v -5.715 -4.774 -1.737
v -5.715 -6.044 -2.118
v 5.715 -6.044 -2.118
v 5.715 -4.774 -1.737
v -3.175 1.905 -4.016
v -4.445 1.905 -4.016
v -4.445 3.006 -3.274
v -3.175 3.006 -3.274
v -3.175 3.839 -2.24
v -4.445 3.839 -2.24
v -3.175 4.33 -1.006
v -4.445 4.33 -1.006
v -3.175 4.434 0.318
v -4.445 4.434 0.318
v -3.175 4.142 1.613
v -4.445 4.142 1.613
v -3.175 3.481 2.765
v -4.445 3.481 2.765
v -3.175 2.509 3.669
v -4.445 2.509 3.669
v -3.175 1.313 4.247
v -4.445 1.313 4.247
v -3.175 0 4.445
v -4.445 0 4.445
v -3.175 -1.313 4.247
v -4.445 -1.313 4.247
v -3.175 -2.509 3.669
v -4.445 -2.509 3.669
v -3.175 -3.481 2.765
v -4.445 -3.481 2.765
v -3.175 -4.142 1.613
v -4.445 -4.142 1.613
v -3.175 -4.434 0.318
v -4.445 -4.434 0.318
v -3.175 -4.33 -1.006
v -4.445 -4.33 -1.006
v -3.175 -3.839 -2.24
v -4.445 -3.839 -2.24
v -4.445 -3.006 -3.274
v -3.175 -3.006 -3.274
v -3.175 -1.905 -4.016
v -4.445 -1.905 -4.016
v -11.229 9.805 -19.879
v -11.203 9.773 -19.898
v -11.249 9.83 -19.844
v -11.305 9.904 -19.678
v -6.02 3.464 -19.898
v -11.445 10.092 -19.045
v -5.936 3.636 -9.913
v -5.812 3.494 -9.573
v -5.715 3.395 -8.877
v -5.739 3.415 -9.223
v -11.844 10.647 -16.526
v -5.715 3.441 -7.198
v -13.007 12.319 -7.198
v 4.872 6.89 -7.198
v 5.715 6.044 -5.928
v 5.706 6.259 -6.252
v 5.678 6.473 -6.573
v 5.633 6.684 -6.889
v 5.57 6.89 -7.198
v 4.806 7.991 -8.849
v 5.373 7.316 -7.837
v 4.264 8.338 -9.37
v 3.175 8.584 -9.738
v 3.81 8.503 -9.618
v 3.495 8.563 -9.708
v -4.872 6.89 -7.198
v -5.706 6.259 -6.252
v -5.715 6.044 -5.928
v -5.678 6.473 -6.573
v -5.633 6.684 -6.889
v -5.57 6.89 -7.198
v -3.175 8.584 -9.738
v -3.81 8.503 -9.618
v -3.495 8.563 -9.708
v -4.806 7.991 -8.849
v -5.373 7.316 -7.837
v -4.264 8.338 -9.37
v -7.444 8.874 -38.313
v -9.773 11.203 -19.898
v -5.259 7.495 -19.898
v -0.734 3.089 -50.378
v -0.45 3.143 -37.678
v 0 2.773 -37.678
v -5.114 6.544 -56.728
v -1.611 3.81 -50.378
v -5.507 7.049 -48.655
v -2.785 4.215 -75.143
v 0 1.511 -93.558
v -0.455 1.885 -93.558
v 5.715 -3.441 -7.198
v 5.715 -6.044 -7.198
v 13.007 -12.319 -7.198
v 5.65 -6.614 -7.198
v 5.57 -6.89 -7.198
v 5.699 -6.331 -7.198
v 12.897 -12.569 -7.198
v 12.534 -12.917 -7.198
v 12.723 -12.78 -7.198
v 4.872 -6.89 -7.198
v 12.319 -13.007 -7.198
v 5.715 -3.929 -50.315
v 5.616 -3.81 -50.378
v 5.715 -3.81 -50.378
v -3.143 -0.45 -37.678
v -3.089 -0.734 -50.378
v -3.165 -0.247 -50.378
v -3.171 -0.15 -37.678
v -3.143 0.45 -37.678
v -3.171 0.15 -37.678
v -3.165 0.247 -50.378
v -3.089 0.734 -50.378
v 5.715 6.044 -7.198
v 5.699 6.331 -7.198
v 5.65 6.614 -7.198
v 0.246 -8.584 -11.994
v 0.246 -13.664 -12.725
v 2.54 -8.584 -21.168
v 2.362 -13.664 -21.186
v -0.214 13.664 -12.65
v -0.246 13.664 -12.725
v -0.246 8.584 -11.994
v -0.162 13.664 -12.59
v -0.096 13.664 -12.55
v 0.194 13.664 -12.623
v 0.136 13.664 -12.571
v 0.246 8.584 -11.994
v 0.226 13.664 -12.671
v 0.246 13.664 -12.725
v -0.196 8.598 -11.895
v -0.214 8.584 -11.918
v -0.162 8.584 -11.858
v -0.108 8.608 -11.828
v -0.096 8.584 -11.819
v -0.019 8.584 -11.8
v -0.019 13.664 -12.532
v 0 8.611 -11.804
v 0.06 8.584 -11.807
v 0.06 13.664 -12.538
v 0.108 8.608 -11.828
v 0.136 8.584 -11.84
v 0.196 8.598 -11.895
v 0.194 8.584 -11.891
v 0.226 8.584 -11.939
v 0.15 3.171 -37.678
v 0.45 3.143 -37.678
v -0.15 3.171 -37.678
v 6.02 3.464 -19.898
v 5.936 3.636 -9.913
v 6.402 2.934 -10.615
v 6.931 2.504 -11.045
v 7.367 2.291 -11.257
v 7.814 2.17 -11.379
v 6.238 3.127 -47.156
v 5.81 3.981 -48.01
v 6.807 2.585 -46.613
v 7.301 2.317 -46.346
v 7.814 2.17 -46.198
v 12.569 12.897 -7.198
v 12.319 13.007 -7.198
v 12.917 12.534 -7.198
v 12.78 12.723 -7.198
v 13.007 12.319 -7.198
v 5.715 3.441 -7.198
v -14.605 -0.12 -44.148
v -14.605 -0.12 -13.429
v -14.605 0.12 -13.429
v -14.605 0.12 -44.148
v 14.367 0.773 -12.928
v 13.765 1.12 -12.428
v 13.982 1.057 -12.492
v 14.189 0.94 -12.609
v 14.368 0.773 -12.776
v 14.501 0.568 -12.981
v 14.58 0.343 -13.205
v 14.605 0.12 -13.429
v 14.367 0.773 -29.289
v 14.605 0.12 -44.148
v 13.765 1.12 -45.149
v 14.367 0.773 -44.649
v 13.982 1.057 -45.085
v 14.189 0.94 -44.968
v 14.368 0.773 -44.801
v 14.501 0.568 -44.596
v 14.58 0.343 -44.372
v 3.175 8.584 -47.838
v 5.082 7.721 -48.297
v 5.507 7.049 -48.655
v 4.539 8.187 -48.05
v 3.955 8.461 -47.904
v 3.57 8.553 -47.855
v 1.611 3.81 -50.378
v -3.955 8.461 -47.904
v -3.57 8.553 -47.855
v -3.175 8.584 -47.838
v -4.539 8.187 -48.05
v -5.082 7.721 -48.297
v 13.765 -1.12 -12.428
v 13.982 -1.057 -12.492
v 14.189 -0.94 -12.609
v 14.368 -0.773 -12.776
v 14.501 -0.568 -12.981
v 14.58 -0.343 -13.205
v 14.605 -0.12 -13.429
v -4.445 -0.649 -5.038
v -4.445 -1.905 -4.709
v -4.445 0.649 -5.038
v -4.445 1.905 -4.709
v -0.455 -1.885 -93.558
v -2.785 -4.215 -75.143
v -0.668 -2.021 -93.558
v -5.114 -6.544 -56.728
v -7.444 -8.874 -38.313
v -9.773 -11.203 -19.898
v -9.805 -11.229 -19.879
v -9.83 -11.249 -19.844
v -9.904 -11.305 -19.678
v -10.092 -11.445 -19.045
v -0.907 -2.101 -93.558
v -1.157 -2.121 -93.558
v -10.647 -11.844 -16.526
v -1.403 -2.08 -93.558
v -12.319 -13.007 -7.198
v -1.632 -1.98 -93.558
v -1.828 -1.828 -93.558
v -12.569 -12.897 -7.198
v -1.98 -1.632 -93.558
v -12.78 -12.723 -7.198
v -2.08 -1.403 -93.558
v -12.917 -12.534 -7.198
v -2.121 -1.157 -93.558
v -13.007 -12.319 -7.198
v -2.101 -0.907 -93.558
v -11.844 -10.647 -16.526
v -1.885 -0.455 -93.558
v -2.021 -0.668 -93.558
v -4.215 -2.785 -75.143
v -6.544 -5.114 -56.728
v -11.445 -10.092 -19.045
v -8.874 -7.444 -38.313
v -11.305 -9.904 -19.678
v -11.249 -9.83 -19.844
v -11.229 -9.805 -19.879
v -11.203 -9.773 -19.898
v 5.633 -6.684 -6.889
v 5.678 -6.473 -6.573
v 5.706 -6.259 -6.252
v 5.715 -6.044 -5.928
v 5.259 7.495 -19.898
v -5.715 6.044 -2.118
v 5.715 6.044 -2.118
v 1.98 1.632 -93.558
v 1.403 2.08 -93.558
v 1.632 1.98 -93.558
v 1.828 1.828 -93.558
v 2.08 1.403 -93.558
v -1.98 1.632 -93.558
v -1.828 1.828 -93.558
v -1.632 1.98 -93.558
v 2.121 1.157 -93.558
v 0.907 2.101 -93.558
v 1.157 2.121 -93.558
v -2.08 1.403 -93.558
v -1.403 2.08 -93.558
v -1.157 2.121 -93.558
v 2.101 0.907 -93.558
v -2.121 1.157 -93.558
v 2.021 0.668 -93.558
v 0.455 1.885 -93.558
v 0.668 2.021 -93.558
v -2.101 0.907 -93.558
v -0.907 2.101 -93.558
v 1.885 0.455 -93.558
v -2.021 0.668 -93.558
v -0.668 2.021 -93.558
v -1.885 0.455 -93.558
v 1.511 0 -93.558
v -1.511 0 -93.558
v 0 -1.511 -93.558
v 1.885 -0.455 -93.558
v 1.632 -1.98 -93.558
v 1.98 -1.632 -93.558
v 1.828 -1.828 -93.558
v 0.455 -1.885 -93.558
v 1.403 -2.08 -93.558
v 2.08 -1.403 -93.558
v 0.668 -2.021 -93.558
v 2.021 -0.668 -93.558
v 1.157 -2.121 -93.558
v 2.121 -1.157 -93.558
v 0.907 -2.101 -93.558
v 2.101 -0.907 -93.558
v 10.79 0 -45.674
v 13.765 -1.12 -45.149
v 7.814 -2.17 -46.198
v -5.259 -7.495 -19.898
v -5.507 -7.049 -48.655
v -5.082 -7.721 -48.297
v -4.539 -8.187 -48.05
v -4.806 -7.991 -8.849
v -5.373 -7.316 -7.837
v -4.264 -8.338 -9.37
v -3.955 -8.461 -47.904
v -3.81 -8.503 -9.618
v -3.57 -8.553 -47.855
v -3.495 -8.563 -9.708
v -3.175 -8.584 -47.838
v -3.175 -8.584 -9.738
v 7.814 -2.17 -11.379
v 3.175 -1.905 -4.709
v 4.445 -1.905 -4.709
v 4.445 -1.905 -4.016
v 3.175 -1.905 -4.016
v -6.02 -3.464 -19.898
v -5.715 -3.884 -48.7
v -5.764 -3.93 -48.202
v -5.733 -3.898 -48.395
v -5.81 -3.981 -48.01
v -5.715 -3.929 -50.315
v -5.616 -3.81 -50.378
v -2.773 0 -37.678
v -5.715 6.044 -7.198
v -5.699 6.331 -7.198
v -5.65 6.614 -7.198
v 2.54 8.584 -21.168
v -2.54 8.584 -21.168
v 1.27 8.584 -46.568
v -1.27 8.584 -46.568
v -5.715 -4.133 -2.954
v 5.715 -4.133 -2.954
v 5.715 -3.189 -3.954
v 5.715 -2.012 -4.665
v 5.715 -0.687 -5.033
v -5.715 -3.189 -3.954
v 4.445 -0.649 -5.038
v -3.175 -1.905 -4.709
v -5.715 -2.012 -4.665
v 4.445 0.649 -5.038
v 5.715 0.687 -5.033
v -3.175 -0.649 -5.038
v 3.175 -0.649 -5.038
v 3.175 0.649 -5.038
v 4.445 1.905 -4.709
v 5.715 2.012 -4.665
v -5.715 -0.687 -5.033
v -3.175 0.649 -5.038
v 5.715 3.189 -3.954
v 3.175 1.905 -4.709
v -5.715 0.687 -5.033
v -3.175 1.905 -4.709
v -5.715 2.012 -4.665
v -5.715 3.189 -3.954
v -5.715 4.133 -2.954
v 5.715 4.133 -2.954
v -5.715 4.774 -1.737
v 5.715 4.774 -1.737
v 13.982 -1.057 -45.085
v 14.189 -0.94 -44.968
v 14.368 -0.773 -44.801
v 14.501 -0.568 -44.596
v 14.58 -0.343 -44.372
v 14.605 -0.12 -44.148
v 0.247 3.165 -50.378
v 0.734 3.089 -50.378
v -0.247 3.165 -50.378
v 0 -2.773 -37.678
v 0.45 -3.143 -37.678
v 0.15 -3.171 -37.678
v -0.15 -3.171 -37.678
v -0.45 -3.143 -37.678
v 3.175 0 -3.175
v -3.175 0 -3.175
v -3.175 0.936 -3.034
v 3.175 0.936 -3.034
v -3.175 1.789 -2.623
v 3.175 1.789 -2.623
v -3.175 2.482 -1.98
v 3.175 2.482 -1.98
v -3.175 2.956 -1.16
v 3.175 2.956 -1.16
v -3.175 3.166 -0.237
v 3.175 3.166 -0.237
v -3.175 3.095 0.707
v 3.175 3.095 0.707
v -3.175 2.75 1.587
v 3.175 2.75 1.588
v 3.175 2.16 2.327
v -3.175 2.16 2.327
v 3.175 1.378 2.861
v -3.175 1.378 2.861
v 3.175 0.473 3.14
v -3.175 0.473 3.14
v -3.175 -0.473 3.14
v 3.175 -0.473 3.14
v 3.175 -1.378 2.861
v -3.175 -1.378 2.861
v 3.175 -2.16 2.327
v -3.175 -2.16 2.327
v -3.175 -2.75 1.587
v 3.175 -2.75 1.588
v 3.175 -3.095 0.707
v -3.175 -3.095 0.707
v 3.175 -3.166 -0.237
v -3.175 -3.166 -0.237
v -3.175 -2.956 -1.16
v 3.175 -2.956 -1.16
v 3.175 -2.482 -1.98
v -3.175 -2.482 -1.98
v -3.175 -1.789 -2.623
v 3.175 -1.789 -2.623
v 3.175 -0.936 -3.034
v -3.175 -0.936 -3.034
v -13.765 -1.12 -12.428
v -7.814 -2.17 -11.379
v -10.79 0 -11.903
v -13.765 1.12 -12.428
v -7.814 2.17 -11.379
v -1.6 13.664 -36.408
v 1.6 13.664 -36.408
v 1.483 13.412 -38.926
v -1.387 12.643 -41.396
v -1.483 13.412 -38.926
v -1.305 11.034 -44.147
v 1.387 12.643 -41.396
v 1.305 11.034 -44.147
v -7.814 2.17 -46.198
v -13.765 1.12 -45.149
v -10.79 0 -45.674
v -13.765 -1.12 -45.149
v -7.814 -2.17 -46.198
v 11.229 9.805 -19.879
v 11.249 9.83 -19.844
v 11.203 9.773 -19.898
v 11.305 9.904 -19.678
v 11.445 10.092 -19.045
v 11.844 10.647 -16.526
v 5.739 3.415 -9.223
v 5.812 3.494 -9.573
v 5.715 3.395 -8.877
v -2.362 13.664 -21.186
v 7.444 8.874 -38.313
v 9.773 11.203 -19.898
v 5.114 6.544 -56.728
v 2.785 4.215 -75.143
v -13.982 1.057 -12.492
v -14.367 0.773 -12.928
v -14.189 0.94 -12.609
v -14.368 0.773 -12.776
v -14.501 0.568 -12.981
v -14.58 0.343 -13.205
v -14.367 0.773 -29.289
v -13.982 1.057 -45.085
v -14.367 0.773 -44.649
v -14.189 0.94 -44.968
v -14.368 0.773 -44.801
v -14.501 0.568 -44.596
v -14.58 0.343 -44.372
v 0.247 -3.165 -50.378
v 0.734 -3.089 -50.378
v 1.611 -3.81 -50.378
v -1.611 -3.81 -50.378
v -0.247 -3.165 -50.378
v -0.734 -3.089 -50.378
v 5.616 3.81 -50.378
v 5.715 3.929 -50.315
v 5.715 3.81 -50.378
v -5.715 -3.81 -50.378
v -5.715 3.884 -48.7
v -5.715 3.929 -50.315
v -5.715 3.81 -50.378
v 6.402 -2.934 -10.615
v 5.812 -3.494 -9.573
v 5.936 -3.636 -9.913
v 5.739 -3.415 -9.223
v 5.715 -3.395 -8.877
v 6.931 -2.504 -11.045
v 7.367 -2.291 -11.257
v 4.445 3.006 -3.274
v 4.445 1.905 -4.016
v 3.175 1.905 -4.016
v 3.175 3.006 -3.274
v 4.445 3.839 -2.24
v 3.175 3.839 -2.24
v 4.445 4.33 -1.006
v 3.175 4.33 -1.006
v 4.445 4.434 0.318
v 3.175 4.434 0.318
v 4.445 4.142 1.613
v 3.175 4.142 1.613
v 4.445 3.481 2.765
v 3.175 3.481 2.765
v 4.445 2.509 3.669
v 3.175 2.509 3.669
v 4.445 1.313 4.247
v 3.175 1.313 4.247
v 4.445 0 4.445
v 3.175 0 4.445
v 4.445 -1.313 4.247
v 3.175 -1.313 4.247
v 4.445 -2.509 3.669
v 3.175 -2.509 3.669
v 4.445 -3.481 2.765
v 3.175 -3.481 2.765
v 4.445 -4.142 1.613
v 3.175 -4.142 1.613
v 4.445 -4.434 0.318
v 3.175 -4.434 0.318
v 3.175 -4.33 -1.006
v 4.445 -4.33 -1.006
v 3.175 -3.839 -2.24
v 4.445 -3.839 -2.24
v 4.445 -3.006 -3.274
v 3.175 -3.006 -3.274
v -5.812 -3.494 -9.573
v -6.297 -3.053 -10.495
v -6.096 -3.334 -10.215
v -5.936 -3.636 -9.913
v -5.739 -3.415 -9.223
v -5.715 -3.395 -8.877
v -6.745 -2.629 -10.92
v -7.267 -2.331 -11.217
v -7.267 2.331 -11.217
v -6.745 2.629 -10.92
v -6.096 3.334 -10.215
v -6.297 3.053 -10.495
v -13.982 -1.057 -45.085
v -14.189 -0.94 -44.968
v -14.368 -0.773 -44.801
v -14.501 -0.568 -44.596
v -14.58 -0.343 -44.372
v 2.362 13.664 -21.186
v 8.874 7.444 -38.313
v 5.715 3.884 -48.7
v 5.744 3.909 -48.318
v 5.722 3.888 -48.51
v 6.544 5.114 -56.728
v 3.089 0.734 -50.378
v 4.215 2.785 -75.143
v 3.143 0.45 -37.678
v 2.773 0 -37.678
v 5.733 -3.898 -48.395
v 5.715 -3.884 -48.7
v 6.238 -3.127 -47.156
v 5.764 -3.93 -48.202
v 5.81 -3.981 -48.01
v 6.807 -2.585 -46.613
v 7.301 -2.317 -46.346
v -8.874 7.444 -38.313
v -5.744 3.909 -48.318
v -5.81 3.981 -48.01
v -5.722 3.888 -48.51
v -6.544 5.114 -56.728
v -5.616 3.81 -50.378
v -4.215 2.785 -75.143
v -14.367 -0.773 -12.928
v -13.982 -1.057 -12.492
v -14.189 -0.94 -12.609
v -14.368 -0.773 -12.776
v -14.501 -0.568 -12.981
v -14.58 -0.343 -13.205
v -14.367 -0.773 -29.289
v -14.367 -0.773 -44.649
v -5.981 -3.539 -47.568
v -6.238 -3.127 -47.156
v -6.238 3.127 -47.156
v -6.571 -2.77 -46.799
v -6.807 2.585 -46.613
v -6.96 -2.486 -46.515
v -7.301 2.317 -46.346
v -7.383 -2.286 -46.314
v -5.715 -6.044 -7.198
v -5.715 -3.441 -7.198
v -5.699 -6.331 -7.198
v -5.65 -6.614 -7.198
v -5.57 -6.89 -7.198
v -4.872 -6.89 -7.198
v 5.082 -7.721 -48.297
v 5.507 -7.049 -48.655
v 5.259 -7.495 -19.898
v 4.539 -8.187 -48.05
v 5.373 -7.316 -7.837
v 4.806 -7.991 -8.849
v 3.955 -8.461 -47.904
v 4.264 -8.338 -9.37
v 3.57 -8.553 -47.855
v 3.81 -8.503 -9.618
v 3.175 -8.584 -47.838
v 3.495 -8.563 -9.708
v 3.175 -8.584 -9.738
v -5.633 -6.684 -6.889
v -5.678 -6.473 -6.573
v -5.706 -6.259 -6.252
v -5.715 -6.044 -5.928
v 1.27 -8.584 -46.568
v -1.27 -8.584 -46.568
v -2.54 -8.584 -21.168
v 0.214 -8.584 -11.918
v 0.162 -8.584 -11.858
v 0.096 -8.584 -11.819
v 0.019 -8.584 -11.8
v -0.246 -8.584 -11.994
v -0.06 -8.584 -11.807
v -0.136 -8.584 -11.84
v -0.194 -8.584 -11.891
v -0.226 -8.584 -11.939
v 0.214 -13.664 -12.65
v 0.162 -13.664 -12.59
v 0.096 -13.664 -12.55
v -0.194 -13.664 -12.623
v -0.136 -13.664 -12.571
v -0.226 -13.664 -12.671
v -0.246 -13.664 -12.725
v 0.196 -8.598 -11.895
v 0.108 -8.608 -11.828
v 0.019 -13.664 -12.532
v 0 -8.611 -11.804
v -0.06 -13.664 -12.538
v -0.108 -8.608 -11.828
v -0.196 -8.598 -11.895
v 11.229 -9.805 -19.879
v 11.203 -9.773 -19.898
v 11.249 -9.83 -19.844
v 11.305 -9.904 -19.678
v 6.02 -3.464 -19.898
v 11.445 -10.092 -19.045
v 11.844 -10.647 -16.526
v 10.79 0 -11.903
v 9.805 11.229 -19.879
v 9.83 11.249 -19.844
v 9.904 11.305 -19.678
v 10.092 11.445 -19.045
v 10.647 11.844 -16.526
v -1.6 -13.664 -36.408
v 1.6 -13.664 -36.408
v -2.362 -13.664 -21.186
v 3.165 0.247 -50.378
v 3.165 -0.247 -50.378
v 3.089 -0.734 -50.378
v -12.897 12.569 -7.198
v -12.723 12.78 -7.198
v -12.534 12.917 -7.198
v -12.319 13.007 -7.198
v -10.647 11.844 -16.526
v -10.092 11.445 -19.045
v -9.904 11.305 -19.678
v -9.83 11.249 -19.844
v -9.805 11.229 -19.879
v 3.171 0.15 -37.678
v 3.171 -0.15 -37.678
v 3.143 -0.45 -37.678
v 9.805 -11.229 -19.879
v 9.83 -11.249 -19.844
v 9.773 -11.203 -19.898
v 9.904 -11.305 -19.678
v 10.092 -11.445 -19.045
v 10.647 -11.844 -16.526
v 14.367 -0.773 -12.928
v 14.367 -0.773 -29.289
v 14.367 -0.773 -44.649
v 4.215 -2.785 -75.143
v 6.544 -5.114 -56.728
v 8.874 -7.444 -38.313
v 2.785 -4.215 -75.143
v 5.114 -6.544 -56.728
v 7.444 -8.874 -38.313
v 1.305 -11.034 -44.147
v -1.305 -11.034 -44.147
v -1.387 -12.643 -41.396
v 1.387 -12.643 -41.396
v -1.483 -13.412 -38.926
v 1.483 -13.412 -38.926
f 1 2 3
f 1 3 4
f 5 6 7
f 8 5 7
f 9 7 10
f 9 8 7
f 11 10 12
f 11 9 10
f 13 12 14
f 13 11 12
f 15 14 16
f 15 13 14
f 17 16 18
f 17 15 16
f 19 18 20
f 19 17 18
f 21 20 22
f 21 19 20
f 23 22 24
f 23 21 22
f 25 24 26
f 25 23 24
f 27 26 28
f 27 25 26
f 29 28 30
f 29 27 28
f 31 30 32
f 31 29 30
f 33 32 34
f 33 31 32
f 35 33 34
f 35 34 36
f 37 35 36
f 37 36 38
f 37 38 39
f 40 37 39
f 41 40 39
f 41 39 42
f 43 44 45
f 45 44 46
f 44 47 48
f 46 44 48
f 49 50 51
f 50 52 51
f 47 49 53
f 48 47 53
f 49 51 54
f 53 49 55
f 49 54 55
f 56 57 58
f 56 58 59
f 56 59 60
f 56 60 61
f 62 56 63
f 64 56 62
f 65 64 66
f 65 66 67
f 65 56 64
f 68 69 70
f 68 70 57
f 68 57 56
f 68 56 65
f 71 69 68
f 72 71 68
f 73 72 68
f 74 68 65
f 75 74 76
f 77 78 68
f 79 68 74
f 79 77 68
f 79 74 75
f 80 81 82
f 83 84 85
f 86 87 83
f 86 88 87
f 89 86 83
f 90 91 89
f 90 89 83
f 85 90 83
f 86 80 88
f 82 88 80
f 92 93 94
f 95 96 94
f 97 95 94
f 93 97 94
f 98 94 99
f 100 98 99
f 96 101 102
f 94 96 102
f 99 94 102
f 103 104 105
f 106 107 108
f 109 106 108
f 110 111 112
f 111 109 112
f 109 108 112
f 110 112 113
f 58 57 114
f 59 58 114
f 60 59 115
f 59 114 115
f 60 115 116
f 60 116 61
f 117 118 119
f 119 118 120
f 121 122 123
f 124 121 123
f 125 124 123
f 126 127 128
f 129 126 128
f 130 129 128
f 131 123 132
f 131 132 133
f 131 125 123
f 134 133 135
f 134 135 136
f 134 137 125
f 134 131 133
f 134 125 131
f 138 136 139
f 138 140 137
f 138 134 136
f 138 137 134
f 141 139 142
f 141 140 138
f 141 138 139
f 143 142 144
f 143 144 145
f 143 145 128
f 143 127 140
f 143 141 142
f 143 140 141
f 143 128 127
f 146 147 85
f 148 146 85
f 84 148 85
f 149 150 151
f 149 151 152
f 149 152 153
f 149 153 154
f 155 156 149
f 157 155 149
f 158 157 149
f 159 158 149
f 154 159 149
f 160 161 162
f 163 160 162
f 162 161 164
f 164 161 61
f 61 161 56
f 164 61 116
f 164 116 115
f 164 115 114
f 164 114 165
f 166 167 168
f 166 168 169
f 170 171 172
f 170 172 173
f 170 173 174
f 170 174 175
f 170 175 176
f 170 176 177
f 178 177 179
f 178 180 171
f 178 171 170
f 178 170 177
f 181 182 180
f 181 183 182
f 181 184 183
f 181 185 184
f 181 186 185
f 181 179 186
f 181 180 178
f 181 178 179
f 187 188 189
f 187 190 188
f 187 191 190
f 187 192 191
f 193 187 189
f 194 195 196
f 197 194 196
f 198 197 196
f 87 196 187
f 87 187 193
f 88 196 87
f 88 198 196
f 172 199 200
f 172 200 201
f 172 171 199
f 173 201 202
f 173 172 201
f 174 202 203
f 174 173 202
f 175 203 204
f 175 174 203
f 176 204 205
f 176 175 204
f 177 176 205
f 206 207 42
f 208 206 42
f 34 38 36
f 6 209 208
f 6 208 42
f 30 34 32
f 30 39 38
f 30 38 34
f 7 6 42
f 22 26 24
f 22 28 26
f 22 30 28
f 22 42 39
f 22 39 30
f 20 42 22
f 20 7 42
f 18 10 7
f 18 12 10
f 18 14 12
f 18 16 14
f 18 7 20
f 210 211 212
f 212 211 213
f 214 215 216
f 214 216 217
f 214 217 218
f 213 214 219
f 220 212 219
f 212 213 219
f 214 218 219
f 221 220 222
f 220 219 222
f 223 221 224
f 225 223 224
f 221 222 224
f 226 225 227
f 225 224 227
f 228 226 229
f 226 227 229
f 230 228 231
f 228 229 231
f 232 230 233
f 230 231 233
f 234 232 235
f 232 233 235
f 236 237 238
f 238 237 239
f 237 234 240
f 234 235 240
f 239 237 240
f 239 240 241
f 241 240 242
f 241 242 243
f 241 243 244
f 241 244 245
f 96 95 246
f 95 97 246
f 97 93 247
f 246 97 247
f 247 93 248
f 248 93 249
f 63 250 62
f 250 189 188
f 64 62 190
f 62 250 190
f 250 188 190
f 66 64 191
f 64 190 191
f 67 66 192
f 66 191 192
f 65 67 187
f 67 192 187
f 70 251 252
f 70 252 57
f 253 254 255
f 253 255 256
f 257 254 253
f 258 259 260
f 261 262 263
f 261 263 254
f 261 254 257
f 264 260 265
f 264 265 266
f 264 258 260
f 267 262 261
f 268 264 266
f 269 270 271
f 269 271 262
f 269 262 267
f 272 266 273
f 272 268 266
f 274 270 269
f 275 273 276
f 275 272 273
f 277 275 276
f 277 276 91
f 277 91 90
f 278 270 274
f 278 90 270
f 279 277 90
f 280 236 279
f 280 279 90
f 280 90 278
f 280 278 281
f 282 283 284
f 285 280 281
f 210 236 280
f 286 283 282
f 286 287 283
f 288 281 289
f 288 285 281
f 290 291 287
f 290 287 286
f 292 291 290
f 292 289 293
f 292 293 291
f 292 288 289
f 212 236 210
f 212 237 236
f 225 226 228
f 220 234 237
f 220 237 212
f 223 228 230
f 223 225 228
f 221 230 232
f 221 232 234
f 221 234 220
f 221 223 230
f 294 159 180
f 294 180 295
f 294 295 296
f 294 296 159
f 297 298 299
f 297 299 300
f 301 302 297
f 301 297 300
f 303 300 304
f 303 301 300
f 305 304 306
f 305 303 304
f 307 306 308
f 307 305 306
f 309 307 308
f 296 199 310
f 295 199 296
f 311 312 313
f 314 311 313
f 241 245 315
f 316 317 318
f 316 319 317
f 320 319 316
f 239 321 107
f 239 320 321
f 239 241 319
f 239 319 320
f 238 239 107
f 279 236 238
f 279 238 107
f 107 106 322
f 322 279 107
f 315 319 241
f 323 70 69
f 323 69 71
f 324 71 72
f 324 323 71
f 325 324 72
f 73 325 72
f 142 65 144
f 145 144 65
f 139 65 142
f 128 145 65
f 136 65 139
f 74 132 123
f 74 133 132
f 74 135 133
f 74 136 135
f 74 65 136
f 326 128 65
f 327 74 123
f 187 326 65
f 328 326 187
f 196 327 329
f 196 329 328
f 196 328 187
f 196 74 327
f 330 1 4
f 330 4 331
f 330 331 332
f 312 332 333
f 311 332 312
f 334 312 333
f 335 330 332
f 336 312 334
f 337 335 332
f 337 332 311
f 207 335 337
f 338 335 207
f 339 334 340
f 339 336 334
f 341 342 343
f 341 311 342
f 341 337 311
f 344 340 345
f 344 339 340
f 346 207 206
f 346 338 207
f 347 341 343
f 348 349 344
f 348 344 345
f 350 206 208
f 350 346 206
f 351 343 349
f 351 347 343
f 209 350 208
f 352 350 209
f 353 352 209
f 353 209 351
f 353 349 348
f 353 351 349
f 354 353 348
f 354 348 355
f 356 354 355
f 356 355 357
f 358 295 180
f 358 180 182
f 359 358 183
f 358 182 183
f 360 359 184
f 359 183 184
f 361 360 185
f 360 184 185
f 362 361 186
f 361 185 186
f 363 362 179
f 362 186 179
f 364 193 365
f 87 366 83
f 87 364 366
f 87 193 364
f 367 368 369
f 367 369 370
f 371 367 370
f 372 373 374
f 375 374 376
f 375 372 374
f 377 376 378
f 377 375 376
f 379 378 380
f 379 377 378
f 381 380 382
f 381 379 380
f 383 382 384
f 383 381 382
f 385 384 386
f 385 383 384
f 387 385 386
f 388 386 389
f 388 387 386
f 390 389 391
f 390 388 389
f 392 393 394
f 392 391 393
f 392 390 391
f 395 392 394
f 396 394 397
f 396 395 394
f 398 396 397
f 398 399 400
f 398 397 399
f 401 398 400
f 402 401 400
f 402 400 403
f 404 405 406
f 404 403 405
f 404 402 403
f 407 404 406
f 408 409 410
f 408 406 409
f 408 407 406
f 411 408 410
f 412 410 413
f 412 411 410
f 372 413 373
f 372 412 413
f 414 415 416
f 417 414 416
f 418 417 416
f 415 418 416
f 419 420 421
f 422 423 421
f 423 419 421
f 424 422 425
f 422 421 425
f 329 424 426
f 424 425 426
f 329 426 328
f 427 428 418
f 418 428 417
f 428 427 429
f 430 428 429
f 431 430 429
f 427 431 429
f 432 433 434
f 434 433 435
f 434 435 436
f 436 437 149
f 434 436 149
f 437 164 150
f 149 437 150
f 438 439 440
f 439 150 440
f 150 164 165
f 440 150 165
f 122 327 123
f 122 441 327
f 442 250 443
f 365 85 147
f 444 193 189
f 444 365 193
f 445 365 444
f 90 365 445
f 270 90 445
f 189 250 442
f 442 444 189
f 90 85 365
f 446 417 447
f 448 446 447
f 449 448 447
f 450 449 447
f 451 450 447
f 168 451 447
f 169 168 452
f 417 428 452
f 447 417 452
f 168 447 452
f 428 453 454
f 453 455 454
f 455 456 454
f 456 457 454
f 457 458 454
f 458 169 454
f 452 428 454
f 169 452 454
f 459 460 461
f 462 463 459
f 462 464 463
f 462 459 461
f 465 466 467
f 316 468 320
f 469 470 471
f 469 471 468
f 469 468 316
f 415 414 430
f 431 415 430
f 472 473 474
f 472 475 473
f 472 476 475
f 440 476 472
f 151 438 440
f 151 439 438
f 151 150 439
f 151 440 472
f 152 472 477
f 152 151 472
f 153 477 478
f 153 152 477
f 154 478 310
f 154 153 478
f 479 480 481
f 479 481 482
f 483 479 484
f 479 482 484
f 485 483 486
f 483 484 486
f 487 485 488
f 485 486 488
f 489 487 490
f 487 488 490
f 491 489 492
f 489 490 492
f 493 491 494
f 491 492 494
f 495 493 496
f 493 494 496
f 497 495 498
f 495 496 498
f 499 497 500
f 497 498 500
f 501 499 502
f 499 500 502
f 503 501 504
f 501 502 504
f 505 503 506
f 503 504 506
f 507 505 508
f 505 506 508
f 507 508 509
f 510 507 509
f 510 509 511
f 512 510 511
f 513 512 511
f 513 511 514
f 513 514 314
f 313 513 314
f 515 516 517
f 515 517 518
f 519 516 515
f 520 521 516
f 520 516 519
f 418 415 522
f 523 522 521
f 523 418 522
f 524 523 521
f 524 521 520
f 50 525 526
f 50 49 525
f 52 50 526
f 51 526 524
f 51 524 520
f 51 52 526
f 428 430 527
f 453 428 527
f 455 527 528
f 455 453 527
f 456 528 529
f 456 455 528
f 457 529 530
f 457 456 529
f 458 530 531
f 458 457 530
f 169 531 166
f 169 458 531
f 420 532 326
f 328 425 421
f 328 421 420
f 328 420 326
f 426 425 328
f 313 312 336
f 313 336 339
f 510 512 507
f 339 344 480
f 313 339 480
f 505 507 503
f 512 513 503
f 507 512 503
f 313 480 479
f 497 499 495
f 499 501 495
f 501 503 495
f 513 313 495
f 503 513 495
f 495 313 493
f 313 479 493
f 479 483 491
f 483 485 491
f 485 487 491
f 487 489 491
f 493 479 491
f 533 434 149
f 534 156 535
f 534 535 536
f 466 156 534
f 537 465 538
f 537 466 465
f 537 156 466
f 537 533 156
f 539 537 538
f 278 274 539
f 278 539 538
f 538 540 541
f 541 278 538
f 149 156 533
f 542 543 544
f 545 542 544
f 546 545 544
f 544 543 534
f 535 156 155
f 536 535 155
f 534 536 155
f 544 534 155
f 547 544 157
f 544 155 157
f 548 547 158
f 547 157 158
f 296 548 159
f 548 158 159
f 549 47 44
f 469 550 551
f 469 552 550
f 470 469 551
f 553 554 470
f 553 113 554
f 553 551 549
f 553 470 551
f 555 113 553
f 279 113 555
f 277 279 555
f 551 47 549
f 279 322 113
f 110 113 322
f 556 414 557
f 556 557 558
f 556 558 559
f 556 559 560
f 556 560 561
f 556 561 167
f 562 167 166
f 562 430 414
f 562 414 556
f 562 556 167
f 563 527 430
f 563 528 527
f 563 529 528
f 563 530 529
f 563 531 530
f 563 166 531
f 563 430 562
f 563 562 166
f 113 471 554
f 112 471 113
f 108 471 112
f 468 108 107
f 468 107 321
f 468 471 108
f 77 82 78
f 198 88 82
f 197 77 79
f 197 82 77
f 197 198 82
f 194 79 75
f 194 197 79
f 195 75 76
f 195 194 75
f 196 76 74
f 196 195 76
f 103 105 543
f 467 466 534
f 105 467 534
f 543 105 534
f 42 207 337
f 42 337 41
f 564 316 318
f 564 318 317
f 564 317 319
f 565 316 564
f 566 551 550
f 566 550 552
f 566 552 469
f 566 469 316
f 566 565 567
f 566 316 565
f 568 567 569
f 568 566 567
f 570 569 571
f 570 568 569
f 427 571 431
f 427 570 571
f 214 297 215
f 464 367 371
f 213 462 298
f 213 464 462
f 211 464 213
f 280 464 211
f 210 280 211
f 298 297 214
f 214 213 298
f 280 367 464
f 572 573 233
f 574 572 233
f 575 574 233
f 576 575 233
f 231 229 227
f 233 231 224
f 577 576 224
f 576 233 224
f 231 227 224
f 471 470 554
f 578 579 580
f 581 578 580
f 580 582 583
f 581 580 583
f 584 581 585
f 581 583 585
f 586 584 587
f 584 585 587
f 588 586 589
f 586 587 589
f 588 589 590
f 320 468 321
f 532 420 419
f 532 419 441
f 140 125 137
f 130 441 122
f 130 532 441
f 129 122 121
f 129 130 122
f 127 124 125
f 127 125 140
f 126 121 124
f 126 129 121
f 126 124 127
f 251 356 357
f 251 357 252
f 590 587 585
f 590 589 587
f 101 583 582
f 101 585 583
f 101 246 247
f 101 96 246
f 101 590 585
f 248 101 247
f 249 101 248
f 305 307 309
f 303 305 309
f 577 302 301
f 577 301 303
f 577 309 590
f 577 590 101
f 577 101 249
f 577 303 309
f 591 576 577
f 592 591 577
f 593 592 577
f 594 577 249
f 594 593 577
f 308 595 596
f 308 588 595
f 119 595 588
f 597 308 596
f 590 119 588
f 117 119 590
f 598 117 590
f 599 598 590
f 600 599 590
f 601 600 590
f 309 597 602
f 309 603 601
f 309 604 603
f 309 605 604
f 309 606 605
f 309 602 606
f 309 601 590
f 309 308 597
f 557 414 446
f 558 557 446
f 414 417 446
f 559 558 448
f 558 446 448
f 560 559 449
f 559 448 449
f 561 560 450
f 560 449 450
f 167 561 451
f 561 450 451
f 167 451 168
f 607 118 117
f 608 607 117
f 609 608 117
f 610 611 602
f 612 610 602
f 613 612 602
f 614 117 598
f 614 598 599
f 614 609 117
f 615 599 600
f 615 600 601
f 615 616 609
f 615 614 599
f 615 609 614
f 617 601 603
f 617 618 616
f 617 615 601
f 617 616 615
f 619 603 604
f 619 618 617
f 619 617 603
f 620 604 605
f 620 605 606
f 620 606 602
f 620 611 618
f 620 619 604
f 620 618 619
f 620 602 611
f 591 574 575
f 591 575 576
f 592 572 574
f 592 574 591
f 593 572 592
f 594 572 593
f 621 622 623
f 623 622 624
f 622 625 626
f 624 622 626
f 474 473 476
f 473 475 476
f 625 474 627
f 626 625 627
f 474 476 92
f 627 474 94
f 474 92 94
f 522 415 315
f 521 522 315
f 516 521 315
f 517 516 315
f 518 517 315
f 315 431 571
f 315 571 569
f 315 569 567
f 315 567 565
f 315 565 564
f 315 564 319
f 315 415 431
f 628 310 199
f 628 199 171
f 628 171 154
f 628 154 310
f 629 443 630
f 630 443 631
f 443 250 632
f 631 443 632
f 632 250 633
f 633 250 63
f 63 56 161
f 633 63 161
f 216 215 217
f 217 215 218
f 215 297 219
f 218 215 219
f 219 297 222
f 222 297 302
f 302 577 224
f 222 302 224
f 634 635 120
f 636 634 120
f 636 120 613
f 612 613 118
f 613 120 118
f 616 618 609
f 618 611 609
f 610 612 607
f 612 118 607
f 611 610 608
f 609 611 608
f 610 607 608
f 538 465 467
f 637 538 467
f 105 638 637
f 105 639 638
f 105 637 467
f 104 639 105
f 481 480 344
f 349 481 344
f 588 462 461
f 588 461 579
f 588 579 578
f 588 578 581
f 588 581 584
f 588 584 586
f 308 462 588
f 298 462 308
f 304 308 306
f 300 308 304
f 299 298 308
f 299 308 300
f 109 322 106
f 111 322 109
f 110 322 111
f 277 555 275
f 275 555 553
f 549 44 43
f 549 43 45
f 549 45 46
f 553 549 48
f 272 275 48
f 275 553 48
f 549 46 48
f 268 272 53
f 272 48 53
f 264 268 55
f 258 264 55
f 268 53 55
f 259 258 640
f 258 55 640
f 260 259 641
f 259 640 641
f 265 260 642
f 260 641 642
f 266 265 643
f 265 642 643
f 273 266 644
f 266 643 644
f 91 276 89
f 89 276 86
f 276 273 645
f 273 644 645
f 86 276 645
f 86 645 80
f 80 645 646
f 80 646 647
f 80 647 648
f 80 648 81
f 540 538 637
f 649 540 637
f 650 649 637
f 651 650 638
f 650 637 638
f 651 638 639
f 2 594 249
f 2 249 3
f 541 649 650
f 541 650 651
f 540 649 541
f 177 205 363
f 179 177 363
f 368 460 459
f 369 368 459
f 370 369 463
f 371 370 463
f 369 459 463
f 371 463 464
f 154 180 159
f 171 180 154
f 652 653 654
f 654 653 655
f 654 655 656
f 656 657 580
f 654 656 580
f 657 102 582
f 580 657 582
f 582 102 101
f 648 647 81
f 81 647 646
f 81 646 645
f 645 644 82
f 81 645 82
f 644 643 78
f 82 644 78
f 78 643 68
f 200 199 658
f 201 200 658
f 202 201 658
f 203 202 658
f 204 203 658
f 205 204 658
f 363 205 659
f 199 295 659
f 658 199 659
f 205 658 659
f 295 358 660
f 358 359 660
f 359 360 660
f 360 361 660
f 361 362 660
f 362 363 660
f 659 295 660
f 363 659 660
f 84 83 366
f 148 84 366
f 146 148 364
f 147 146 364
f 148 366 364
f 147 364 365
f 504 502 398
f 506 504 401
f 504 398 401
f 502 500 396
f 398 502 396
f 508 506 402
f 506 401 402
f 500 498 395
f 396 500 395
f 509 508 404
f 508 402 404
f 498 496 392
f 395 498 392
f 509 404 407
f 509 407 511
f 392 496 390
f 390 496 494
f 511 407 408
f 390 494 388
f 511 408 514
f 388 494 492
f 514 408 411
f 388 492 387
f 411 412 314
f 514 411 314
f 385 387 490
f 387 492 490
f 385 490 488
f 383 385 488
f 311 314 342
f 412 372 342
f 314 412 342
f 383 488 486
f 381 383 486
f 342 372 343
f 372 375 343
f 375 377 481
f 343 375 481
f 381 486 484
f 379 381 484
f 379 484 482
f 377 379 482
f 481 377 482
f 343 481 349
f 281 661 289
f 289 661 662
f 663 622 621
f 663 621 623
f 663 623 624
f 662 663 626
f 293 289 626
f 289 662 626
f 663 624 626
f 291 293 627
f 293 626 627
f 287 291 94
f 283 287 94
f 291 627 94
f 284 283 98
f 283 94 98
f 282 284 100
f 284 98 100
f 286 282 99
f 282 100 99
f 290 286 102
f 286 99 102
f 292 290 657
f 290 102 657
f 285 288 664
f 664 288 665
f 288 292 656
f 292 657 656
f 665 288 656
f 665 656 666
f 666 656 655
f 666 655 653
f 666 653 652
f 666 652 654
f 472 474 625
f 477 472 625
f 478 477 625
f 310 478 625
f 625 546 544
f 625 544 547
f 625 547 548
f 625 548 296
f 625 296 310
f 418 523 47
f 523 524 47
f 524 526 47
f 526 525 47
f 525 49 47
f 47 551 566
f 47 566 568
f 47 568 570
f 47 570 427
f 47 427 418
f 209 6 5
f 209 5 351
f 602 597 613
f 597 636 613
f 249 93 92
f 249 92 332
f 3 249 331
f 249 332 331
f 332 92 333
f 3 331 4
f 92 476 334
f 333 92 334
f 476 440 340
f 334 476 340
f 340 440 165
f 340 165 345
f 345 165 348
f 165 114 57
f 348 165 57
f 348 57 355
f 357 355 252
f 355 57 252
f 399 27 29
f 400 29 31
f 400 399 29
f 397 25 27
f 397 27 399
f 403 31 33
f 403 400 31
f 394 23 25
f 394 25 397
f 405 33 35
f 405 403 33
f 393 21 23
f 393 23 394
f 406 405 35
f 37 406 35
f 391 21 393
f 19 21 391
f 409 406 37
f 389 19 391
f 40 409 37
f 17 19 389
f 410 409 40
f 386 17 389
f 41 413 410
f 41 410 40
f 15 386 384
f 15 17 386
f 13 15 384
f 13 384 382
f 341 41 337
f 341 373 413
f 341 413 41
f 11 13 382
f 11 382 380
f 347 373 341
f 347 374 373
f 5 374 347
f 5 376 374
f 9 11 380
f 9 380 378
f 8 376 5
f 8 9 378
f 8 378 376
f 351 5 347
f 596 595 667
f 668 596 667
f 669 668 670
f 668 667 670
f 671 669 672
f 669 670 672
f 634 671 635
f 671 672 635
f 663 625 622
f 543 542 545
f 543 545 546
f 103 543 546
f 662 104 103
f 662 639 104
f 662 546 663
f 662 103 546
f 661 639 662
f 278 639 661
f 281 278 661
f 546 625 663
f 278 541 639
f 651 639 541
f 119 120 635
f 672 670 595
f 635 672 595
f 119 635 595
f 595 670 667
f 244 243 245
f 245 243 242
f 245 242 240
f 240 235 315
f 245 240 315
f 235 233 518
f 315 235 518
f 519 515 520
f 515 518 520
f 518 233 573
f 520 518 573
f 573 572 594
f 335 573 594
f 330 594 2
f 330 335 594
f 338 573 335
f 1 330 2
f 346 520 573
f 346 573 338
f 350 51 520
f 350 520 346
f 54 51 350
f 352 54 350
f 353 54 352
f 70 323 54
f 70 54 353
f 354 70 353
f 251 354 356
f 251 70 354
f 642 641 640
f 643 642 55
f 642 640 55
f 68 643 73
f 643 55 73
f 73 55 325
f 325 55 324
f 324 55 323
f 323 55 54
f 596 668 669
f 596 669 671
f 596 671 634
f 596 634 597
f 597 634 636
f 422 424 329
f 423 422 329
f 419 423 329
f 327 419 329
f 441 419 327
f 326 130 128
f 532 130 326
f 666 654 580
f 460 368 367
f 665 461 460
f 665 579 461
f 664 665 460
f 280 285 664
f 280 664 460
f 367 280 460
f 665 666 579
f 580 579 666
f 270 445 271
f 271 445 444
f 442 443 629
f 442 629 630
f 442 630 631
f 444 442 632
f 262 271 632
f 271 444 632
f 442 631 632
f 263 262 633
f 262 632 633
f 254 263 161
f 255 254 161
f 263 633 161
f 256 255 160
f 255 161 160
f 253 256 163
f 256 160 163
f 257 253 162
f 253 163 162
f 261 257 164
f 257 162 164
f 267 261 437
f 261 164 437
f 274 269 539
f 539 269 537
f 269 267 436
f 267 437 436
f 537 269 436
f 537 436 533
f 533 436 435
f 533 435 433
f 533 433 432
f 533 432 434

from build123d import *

# Parameters (mm, degrees)
SKETCH1_R                     = 3.175
BOSS_EXTRUDE1_DEPTH           = 3.175
SKETCH2_R                     = 4.444999999999999
BOSS_EXTRUDE2_DEPTH           = 1.27
BOSS_EXTRUDE3_DEPTH           = 1.27
BOSS_EXTRUDE4_DEPTH           = 8.89
BOSS_EXTRUDE4_DEPTH_BACK      = 2.54
SKETCH5_R                     = 3.175
CUT_EXTRUDE1_DEPTH            = 12.7
FILLET1_R                     = 2.54
SKETCH6_W                     = 35.559999999999995
SKETCH6_H                     = 5.08
BOSS_EXTRUDE5_DEPTH           = 8.889999999999999
BOSS_EXTRUDE5_TAPER           = 10.000000000000021
FILLET2_R                     = 1.016
FILLET3_R                     = 2.54
BOSS_EXTRUDE6_DEPTH           = 5.079999999999994
BOSS_EXTRUDE6_TAPER           = 2.000000000000002
FILLET4_R                     = 0.254
FILLET5_R                     = 12.7
BOSS_EXTRUDE7_DEPTH           = 73.66
BOSS_EXTRUDE7_TAPER           = 1.0000000000000022
BOSS_EXTRUDE7_OTHER_WAY_DEPTH = 12.700000000000001
BOSS_EXTRUDE7_OTHER_WAY_TAPER = 1.0000000000000022
FILLET6_R                     = 1.016


with BuildPart() as part:
    # Sketch1 → Boss-Extrude1 (new, symmetric)
    with BuildSketch(Plane(origin=(0, 0, 0), x_dir=(0, 0, -1), z_dir=(1, 0, 0))):
        Circle(SKETCH1_R)
    extrude(amount=BOSS_EXTRUDE1_DEPTH, both=True)

    # Sketch2 → Boss-Extrude2 (add)
    with BuildSketch(Plane(origin=(3.175, 0, 0), x_dir=(0, 0, -1), z_dir=(1, 0, 0))):
        Circle(SKETCH2_R)
    boss_extrude2 = extrude(amount=BOSS_EXTRUDE2_DEPTH)

    # Mirror1: Boss-Extrude2 across plane
    add(boss_extrude2.mirror(Plane(origin=(0, 0, 0), x_dir=(0, 0, 1), z_dir=(1, 0, 0))))

    # Sketch3 → Boss-Extrude3 (add)
    with BuildSketch(Plane(origin=(4.445, 0, 0), x_dir=(0, 0, -1), z_dir=(1, 0, 0))):
        Polygon((-7.3e-16, 1.9049999999999998), (6.349999999999998, 1.9050000000000038), (6.349999999999999, -1.9049999999999998), (4.4e-16, -1.9049999999999998), align=None)
    boss_extrude3 = extrude(amount=-BOSS_EXTRUDE3_DEPTH)

    # Mirror2: Boss-Extrude3 across plane
    add(boss_extrude3.mirror(Plane(origin=(0, 0, 0), x_dir=(0, 0, 1), z_dir=(1, 0, 0))))

    # Sketch4 → Boss-Extrude4 (add, two sides: drawn at the far end of the back side and taken through both)
    with BuildSketch(Plane(origin=(-3.175, 0, 0), x_dir=(0, 0, -1), z_dir=(1, 0, 0)).offset(-BOSS_EXTRUDE4_DEPTH_BACK)):
        with BuildLine():
            Line((1.7374623280944008, 4.773638513592414), (2.1184623280943997, 6.0436385135924136))
            Line((2.1184623280943997, 6.0436385135924136), (5.928462328094399, 6.0436385135924136))
            Line((5.928462328094399, 6.0436385135924136), (9.738462328094398, 8.583638513592414))
            Line((9.738462328094398, 8.583638513592414), (47.838462328094394, 8.583638513592414))
            Line((47.838462328094394, 8.583638513592414), (50.3784623280944, 3.8099999999999996))
            Line((50.3784623280944, 3.8099999999999996), (50.3784623280944, -3.8099999999999996))
            Line((50.3784623280944, -3.8099999999999996), (47.838462328094394, -8.583638513592414))
            Line((47.838462328094394, -8.583638513592414), (9.738462328094398, -8.583638513592414))
            Line((9.738462328094398, -8.583638513592414), (5.928462328094399, -6.0436385135924136))
            Line((5.928462328094399, -6.0436385135924136), (2.1184623280943997, -6.0436385135924136))
            Line((2.1184623280943997, -6.0436385135924136), (1.7374623280944008, -4.773638513592414))
            ThreePointArc((1.7374623280944008, -4.773638513592414), (5.080000000000001, 0), (1.7374623280944008, 4.773638513592414))
        make_face()
    extrude(amount=BOSS_EXTRUDE4_DEPTH + BOSS_EXTRUDE4_DEPTH_BACK)

    # Sketch5 → Cut-Extrude1 (cut)
    with BuildSketch(Plane(origin=(0, 0, -50.3784623280944), x_dir=(-1, 0, 0), z_dir=(0, 0, -1))):
        Circle(SKETCH5_R)
    extrude(amount=-CUT_EXTRUDE1_DEPTH, mode=Mode.SUBTRACT)

    # Fillet1
    fillet1_edges = [part.edges().sort_by_distance(p)[0] for p in [
        (5.715000000000001, -8.583638513592414, -28.788462328094397),
        (-5.715, -8.583638513592414, -28.788462328094397),
        (-5.715, 8.583638513592414, -28.788462328094397),
        (5.715000000000001, 8.583638513592414, -28.788462328094397),
    ]]
    fillet(fillet1_edges, radius=FILLET1_R)

    # Sketch6 → Boss-Extrude5 (add)
    with BuildSketch(Plane(origin=(5.715000000000001, 0, 0), x_dir=(0, 0, -1), z_dir=(1, 0, 0))):
        with Locations((28.7884623280944, 0)):
            Rectangle(SKETCH6_W, SKETCH6_H)
    boss_extrude5 = extrude(amount=BOSS_EXTRUDE5_DEPTH, taper=BOSS_EXTRUDE5_TAPER)

    # Mirror3: Boss-Extrude5 across plane
    add(boss_extrude5.mirror(Plane(origin=(0, 0, 0), x_dir=(0, 0, 1), z_dir=(1, 0, 0))))

    # Fillet2
    fillet2_edges = [part.edges().sort_by_distance(p)[0] for p in [
        (14.605, -1.6e-16, -12.57600918659266),
        (14.605, -0.9724531415017433, -28.788462328094404),
        (14.605, -1.6e-16, -45.00091546959614),
        (14.605, 0.9724531415017431, -28.788462328094397),
        (-14.605, -1.6e-16, -12.57600918659266),
        (-14.605, 0.9724531415017431, -28.788462328094397),
        (-14.605, -1.6e-16, -45.00091546959614),
        (-14.605, -0.9724531415017433, -28.788462328094404),
    ]]
    fillet(fillet2_edges, radius=FILLET2_R)

    # Fillet3
    fillet3_edges = [part.edges().sort_by_distance(p)[0] for p in [
        (5.715000000000001, 0, -11.008462328094403),
        (5.715000000000001, -2.54, -28.7884623280944),
        (5.715000000000001, 0, -46.5684623280944),
        (5.715000000000001, 2.54, -28.7884623280944),
        (-5.715000000000001, 0, -11.008462328094403),
        (-5.715000000000001, -2.54, -28.7884623280944),
        (-5.715000000000001, 0, -46.5684623280944),
        (-5.715000000000001, 2.54, -28.7884623280944),
    ]]
    fillet(fillet3_edges, radius=FILLET3_R)

    # Sketch7 → Boss-Extrude6 (add)
    with BuildSketch(Plane(origin=(0, 8.583638513592414, 0), x_dir=(1, 0, 0), z_dir=(0, 1, 0))):
        Polygon((-1.27, 46.568462328094405), (-2.5399999999999983, 21.168462328094403), (0, 11.0084623280944), (2.5399999999999983, 21.168462328094403), (1.27, 46.568462328094405), align=None)
    boss_extrude6 = extrude(amount=BOSS_EXTRUDE6_DEPTH, taper=BOSS_EXTRUDE6_TAPER)

    # Mirror4: Boss-Extrude6 across plane
    add(boss_extrude6.mirror(Plane.ZX))

    # Fillet4
    fillet4_edges = [part.edges().sort_by_distance(p)[0] for p in [
        (0, 11.123638513592411, -11.3741766617959),
        (0, -11.123638513592411, -11.3741766617959),
    ]]
    fillet(fillet4_edges, radius=FILLET4_R)

    # Fillet5
    # the kernel refuses this fillet: 12.7 mm, written as the material it takes off along each edge
    with BuildSketch(Plane(origin=(26.057756985420163, -13.663638513592407, -46.39106481907633), x_dir=(0, 0.9993908270190958, -0.03489949670250099), z_dir=(-1, 0, 0))) as fillet5_piece_1:
        with BuildLine():
            CenterArc((12.343875700426112, -10.419744967387068), FILLET5_R, 124.86989764584403, 53.130102354155966)
            Line((-0.34838780271640163, -9.976521359265305), (-0.6022330727792515, -9.96765688710287))
            Line((-0.6022330727792515, -9.96765688710287), (-0.2538452700628499, 0.00886447216243524))
            Line((-0.2538452700628499, 0.00886447216243524), (6.6e-16, 0.2539999999999965))
            ThreePointArc((6.6e-16, 0.2539999999999965), (2.5415482425190037, 0.25399999999999656), (4.9378809007302475, 0.2083948993477439))
            Line((4.9378809007302475, 0.2083948993477439), (5.083096485038009, 0))
        make_face()
    extrude(amount=52.11551397084032, mode=Mode.SUBTRACT)
    with BuildSketch(Plane(origin=(26.057756985420163, 13.663638513592407, -46.39106481907633), x_dir=(0, -0.9993908270190958, -0.03489949670250099), z_dir=(-1, 0, 0))) as fillet5_piece_2:
        with BuildLine():
            CenterArc((12.343875700426112, 10.419744967387068), FILLET5_R, 182, 53.13010235415595)
            Line((-0.34838780271640163, 9.976521359265305), (-0.6022330727792515, 9.96765688710287))
            Line((-0.6022330727792515, 9.96765688710287), (-0.2538452700628499, -0.00886447216243524))
            Line((-0.2538452700628499, -0.00886447216243524), (6.6e-16, -0.2539999999999965))
            ThreePointArc((6.6e-16, -0.2539999999999965), (2.5415482425190037, -0.25399999999999656), (4.9378809007302475, -0.2083948993477439))
            Line((4.9378809007302475, -0.2083948993477439), (5.083096485038009, 0))
        make_face()
    extrude(amount=52.11551397084032, mode=Mode.SUBTRACT)

    # Sketch8 → Boss-Extrude7 (add)
    with BuildSketch(Plane(origin=(0, 0, -19.8984623280944), x_dir=(-1, 0, 0), z_dir=(0, 0, -1))):
        Polygon((0, 3.175), (-17.779999999999934, 17.779999999999987), (-3.175, -2e-16), (-17.779999999999934, -17.779999999999987), (0, -3.175), (17.779999999999934, -17.78), (3.175, 0), (17.779999999999934, 17.78), align=None)
    extrude(amount=BOSS_EXTRUDE7_DEPTH, taper=BOSS_EXTRUDE7_TAPER)

    # Sketch8 → Boss-Extrude7 other way (add)
    with BuildSketch(Plane(origin=(0, 0, -19.8984623280944), x_dir=(-1, 0, 0), z_dir=(0, 0, -1))):
        Polygon((0, 3.175), (-17.779999999999934, 17.779999999999987), (-3.175, -2e-16), (-17.779999999999934, -17.779999999999987), (0, -3.175), (17.779999999999934, -17.78), (3.175, 0), (17.779999999999934, 17.78), align=None)
    extrude(amount=-BOSS_EXTRUDE7_OTHER_WAY_DEPTH, taper=BOSS_EXTRUDE7_OTHER_WAY_TAPER)

    # Fillet6
    # the kernel refuses this fillet: 1.016 mm, written as the material it takes off along each edge
    with BuildSketch(Plane(origin=(-20.95567858297953, -20.95567858297961, 5.206103382012049), x_dir=(0.7627077129659504, 0.622551588883571, 0.17523259902424146), z_dir=(0.12452118344129766, 0.12452118344129816, -0.984372363360917))) as fillet6_piece_1:
        with BuildLine():
            CenterArc((FILLET6_R * 10.0405981063, -FILLET6_R), FILLET6_R, 90.0000000000001, 168.62469070380405)
            Line((FILLET6_R * 9.84336321649, -FILLET6_R * 1.98035626088), (0, 0))
            Line((0, 0), (FILLET6_R * 10.0405981063, 3e-17))
        make_face()
    extrude(amount=125.83564515900238, mode=Mode.SUBTRACT)
    with BuildSketch(Plane(origin=(-20.95567858297728, 20.955678582977363, 5.2061033819942395), x_dir=(0.7627077129659501, -0.6225515888835714, 0.17523259902424151), z_dir=(0.12452118344129769, -0.12452118344129823, -0.984372363360917))) as fillet6_piece_2:
        with BuildLine():
            CenterArc((FILLET6_R * 10.0405981063, FILLET6_R), FILLET6_R, 101.37530929619633, 168.62469070380357)
            Line((FILLET6_R * 9.84336321649, FILLET6_R * 1.98035626088), (0, 0))
            Line((0, 0), (FILLET6_R * 10.0405981063, 7e-17))
        make_face()
    extrude(amount=125.8356451589662, mode=Mode.SUBTRACT)
    with BuildSketch(Plane(origin=(20.955678582977644, -20.955678582977715, 5.2061033819972735), x_dir=(-0.6225515888835683, 0.7627077129659525, 0.1752325990242418), z_dir=(-0.1245211834412979, 0.1245211834412984, -0.984372363360917))) as fillet6_piece_3:
        with BuildLine():
            CenterArc((FILLET6_R * 10.0405981063, -FILLET6_R), FILLET6_R, 90, 168.62469070380405)
            Line((FILLET6_R * 9.84336321649, -FILLET6_R * 1.98035626088), (0, 0))
            Line((0, 0), (FILLET6_R * 10.0405981063, 8.1e-16))
        make_face()
    extrude(amount=125.83564515897237, mode=Mode.SUBTRACT)
    with BuildSketch(Plane(origin=(20.955678582978695, 20.95567858297876, 5.2061033820054945), x_dir=(-0.7627077129659505, -0.6225515888835708, 0.17523259902424118), z_dir=(-0.12452118344129749, -0.12452118344129792, -0.984372363360917))) as fillet6_piece_4:
        with BuildLine():
            CenterArc((FILLET6_R * 10.0405981063, -FILLET6_R), FILLET6_R, 90, 168.62469070380394)
            Line((FILLET6_R * 9.84336321649, -FILLET6_R * 1.98035626088), (0, 0))
            Line((0, 0), (FILLET6_R * 10.0405981063, -1.51e-15))
        make_face()
    extrude(amount=125.83564515898904, mode=Mode.SUBTRACT)


solid = part.part
